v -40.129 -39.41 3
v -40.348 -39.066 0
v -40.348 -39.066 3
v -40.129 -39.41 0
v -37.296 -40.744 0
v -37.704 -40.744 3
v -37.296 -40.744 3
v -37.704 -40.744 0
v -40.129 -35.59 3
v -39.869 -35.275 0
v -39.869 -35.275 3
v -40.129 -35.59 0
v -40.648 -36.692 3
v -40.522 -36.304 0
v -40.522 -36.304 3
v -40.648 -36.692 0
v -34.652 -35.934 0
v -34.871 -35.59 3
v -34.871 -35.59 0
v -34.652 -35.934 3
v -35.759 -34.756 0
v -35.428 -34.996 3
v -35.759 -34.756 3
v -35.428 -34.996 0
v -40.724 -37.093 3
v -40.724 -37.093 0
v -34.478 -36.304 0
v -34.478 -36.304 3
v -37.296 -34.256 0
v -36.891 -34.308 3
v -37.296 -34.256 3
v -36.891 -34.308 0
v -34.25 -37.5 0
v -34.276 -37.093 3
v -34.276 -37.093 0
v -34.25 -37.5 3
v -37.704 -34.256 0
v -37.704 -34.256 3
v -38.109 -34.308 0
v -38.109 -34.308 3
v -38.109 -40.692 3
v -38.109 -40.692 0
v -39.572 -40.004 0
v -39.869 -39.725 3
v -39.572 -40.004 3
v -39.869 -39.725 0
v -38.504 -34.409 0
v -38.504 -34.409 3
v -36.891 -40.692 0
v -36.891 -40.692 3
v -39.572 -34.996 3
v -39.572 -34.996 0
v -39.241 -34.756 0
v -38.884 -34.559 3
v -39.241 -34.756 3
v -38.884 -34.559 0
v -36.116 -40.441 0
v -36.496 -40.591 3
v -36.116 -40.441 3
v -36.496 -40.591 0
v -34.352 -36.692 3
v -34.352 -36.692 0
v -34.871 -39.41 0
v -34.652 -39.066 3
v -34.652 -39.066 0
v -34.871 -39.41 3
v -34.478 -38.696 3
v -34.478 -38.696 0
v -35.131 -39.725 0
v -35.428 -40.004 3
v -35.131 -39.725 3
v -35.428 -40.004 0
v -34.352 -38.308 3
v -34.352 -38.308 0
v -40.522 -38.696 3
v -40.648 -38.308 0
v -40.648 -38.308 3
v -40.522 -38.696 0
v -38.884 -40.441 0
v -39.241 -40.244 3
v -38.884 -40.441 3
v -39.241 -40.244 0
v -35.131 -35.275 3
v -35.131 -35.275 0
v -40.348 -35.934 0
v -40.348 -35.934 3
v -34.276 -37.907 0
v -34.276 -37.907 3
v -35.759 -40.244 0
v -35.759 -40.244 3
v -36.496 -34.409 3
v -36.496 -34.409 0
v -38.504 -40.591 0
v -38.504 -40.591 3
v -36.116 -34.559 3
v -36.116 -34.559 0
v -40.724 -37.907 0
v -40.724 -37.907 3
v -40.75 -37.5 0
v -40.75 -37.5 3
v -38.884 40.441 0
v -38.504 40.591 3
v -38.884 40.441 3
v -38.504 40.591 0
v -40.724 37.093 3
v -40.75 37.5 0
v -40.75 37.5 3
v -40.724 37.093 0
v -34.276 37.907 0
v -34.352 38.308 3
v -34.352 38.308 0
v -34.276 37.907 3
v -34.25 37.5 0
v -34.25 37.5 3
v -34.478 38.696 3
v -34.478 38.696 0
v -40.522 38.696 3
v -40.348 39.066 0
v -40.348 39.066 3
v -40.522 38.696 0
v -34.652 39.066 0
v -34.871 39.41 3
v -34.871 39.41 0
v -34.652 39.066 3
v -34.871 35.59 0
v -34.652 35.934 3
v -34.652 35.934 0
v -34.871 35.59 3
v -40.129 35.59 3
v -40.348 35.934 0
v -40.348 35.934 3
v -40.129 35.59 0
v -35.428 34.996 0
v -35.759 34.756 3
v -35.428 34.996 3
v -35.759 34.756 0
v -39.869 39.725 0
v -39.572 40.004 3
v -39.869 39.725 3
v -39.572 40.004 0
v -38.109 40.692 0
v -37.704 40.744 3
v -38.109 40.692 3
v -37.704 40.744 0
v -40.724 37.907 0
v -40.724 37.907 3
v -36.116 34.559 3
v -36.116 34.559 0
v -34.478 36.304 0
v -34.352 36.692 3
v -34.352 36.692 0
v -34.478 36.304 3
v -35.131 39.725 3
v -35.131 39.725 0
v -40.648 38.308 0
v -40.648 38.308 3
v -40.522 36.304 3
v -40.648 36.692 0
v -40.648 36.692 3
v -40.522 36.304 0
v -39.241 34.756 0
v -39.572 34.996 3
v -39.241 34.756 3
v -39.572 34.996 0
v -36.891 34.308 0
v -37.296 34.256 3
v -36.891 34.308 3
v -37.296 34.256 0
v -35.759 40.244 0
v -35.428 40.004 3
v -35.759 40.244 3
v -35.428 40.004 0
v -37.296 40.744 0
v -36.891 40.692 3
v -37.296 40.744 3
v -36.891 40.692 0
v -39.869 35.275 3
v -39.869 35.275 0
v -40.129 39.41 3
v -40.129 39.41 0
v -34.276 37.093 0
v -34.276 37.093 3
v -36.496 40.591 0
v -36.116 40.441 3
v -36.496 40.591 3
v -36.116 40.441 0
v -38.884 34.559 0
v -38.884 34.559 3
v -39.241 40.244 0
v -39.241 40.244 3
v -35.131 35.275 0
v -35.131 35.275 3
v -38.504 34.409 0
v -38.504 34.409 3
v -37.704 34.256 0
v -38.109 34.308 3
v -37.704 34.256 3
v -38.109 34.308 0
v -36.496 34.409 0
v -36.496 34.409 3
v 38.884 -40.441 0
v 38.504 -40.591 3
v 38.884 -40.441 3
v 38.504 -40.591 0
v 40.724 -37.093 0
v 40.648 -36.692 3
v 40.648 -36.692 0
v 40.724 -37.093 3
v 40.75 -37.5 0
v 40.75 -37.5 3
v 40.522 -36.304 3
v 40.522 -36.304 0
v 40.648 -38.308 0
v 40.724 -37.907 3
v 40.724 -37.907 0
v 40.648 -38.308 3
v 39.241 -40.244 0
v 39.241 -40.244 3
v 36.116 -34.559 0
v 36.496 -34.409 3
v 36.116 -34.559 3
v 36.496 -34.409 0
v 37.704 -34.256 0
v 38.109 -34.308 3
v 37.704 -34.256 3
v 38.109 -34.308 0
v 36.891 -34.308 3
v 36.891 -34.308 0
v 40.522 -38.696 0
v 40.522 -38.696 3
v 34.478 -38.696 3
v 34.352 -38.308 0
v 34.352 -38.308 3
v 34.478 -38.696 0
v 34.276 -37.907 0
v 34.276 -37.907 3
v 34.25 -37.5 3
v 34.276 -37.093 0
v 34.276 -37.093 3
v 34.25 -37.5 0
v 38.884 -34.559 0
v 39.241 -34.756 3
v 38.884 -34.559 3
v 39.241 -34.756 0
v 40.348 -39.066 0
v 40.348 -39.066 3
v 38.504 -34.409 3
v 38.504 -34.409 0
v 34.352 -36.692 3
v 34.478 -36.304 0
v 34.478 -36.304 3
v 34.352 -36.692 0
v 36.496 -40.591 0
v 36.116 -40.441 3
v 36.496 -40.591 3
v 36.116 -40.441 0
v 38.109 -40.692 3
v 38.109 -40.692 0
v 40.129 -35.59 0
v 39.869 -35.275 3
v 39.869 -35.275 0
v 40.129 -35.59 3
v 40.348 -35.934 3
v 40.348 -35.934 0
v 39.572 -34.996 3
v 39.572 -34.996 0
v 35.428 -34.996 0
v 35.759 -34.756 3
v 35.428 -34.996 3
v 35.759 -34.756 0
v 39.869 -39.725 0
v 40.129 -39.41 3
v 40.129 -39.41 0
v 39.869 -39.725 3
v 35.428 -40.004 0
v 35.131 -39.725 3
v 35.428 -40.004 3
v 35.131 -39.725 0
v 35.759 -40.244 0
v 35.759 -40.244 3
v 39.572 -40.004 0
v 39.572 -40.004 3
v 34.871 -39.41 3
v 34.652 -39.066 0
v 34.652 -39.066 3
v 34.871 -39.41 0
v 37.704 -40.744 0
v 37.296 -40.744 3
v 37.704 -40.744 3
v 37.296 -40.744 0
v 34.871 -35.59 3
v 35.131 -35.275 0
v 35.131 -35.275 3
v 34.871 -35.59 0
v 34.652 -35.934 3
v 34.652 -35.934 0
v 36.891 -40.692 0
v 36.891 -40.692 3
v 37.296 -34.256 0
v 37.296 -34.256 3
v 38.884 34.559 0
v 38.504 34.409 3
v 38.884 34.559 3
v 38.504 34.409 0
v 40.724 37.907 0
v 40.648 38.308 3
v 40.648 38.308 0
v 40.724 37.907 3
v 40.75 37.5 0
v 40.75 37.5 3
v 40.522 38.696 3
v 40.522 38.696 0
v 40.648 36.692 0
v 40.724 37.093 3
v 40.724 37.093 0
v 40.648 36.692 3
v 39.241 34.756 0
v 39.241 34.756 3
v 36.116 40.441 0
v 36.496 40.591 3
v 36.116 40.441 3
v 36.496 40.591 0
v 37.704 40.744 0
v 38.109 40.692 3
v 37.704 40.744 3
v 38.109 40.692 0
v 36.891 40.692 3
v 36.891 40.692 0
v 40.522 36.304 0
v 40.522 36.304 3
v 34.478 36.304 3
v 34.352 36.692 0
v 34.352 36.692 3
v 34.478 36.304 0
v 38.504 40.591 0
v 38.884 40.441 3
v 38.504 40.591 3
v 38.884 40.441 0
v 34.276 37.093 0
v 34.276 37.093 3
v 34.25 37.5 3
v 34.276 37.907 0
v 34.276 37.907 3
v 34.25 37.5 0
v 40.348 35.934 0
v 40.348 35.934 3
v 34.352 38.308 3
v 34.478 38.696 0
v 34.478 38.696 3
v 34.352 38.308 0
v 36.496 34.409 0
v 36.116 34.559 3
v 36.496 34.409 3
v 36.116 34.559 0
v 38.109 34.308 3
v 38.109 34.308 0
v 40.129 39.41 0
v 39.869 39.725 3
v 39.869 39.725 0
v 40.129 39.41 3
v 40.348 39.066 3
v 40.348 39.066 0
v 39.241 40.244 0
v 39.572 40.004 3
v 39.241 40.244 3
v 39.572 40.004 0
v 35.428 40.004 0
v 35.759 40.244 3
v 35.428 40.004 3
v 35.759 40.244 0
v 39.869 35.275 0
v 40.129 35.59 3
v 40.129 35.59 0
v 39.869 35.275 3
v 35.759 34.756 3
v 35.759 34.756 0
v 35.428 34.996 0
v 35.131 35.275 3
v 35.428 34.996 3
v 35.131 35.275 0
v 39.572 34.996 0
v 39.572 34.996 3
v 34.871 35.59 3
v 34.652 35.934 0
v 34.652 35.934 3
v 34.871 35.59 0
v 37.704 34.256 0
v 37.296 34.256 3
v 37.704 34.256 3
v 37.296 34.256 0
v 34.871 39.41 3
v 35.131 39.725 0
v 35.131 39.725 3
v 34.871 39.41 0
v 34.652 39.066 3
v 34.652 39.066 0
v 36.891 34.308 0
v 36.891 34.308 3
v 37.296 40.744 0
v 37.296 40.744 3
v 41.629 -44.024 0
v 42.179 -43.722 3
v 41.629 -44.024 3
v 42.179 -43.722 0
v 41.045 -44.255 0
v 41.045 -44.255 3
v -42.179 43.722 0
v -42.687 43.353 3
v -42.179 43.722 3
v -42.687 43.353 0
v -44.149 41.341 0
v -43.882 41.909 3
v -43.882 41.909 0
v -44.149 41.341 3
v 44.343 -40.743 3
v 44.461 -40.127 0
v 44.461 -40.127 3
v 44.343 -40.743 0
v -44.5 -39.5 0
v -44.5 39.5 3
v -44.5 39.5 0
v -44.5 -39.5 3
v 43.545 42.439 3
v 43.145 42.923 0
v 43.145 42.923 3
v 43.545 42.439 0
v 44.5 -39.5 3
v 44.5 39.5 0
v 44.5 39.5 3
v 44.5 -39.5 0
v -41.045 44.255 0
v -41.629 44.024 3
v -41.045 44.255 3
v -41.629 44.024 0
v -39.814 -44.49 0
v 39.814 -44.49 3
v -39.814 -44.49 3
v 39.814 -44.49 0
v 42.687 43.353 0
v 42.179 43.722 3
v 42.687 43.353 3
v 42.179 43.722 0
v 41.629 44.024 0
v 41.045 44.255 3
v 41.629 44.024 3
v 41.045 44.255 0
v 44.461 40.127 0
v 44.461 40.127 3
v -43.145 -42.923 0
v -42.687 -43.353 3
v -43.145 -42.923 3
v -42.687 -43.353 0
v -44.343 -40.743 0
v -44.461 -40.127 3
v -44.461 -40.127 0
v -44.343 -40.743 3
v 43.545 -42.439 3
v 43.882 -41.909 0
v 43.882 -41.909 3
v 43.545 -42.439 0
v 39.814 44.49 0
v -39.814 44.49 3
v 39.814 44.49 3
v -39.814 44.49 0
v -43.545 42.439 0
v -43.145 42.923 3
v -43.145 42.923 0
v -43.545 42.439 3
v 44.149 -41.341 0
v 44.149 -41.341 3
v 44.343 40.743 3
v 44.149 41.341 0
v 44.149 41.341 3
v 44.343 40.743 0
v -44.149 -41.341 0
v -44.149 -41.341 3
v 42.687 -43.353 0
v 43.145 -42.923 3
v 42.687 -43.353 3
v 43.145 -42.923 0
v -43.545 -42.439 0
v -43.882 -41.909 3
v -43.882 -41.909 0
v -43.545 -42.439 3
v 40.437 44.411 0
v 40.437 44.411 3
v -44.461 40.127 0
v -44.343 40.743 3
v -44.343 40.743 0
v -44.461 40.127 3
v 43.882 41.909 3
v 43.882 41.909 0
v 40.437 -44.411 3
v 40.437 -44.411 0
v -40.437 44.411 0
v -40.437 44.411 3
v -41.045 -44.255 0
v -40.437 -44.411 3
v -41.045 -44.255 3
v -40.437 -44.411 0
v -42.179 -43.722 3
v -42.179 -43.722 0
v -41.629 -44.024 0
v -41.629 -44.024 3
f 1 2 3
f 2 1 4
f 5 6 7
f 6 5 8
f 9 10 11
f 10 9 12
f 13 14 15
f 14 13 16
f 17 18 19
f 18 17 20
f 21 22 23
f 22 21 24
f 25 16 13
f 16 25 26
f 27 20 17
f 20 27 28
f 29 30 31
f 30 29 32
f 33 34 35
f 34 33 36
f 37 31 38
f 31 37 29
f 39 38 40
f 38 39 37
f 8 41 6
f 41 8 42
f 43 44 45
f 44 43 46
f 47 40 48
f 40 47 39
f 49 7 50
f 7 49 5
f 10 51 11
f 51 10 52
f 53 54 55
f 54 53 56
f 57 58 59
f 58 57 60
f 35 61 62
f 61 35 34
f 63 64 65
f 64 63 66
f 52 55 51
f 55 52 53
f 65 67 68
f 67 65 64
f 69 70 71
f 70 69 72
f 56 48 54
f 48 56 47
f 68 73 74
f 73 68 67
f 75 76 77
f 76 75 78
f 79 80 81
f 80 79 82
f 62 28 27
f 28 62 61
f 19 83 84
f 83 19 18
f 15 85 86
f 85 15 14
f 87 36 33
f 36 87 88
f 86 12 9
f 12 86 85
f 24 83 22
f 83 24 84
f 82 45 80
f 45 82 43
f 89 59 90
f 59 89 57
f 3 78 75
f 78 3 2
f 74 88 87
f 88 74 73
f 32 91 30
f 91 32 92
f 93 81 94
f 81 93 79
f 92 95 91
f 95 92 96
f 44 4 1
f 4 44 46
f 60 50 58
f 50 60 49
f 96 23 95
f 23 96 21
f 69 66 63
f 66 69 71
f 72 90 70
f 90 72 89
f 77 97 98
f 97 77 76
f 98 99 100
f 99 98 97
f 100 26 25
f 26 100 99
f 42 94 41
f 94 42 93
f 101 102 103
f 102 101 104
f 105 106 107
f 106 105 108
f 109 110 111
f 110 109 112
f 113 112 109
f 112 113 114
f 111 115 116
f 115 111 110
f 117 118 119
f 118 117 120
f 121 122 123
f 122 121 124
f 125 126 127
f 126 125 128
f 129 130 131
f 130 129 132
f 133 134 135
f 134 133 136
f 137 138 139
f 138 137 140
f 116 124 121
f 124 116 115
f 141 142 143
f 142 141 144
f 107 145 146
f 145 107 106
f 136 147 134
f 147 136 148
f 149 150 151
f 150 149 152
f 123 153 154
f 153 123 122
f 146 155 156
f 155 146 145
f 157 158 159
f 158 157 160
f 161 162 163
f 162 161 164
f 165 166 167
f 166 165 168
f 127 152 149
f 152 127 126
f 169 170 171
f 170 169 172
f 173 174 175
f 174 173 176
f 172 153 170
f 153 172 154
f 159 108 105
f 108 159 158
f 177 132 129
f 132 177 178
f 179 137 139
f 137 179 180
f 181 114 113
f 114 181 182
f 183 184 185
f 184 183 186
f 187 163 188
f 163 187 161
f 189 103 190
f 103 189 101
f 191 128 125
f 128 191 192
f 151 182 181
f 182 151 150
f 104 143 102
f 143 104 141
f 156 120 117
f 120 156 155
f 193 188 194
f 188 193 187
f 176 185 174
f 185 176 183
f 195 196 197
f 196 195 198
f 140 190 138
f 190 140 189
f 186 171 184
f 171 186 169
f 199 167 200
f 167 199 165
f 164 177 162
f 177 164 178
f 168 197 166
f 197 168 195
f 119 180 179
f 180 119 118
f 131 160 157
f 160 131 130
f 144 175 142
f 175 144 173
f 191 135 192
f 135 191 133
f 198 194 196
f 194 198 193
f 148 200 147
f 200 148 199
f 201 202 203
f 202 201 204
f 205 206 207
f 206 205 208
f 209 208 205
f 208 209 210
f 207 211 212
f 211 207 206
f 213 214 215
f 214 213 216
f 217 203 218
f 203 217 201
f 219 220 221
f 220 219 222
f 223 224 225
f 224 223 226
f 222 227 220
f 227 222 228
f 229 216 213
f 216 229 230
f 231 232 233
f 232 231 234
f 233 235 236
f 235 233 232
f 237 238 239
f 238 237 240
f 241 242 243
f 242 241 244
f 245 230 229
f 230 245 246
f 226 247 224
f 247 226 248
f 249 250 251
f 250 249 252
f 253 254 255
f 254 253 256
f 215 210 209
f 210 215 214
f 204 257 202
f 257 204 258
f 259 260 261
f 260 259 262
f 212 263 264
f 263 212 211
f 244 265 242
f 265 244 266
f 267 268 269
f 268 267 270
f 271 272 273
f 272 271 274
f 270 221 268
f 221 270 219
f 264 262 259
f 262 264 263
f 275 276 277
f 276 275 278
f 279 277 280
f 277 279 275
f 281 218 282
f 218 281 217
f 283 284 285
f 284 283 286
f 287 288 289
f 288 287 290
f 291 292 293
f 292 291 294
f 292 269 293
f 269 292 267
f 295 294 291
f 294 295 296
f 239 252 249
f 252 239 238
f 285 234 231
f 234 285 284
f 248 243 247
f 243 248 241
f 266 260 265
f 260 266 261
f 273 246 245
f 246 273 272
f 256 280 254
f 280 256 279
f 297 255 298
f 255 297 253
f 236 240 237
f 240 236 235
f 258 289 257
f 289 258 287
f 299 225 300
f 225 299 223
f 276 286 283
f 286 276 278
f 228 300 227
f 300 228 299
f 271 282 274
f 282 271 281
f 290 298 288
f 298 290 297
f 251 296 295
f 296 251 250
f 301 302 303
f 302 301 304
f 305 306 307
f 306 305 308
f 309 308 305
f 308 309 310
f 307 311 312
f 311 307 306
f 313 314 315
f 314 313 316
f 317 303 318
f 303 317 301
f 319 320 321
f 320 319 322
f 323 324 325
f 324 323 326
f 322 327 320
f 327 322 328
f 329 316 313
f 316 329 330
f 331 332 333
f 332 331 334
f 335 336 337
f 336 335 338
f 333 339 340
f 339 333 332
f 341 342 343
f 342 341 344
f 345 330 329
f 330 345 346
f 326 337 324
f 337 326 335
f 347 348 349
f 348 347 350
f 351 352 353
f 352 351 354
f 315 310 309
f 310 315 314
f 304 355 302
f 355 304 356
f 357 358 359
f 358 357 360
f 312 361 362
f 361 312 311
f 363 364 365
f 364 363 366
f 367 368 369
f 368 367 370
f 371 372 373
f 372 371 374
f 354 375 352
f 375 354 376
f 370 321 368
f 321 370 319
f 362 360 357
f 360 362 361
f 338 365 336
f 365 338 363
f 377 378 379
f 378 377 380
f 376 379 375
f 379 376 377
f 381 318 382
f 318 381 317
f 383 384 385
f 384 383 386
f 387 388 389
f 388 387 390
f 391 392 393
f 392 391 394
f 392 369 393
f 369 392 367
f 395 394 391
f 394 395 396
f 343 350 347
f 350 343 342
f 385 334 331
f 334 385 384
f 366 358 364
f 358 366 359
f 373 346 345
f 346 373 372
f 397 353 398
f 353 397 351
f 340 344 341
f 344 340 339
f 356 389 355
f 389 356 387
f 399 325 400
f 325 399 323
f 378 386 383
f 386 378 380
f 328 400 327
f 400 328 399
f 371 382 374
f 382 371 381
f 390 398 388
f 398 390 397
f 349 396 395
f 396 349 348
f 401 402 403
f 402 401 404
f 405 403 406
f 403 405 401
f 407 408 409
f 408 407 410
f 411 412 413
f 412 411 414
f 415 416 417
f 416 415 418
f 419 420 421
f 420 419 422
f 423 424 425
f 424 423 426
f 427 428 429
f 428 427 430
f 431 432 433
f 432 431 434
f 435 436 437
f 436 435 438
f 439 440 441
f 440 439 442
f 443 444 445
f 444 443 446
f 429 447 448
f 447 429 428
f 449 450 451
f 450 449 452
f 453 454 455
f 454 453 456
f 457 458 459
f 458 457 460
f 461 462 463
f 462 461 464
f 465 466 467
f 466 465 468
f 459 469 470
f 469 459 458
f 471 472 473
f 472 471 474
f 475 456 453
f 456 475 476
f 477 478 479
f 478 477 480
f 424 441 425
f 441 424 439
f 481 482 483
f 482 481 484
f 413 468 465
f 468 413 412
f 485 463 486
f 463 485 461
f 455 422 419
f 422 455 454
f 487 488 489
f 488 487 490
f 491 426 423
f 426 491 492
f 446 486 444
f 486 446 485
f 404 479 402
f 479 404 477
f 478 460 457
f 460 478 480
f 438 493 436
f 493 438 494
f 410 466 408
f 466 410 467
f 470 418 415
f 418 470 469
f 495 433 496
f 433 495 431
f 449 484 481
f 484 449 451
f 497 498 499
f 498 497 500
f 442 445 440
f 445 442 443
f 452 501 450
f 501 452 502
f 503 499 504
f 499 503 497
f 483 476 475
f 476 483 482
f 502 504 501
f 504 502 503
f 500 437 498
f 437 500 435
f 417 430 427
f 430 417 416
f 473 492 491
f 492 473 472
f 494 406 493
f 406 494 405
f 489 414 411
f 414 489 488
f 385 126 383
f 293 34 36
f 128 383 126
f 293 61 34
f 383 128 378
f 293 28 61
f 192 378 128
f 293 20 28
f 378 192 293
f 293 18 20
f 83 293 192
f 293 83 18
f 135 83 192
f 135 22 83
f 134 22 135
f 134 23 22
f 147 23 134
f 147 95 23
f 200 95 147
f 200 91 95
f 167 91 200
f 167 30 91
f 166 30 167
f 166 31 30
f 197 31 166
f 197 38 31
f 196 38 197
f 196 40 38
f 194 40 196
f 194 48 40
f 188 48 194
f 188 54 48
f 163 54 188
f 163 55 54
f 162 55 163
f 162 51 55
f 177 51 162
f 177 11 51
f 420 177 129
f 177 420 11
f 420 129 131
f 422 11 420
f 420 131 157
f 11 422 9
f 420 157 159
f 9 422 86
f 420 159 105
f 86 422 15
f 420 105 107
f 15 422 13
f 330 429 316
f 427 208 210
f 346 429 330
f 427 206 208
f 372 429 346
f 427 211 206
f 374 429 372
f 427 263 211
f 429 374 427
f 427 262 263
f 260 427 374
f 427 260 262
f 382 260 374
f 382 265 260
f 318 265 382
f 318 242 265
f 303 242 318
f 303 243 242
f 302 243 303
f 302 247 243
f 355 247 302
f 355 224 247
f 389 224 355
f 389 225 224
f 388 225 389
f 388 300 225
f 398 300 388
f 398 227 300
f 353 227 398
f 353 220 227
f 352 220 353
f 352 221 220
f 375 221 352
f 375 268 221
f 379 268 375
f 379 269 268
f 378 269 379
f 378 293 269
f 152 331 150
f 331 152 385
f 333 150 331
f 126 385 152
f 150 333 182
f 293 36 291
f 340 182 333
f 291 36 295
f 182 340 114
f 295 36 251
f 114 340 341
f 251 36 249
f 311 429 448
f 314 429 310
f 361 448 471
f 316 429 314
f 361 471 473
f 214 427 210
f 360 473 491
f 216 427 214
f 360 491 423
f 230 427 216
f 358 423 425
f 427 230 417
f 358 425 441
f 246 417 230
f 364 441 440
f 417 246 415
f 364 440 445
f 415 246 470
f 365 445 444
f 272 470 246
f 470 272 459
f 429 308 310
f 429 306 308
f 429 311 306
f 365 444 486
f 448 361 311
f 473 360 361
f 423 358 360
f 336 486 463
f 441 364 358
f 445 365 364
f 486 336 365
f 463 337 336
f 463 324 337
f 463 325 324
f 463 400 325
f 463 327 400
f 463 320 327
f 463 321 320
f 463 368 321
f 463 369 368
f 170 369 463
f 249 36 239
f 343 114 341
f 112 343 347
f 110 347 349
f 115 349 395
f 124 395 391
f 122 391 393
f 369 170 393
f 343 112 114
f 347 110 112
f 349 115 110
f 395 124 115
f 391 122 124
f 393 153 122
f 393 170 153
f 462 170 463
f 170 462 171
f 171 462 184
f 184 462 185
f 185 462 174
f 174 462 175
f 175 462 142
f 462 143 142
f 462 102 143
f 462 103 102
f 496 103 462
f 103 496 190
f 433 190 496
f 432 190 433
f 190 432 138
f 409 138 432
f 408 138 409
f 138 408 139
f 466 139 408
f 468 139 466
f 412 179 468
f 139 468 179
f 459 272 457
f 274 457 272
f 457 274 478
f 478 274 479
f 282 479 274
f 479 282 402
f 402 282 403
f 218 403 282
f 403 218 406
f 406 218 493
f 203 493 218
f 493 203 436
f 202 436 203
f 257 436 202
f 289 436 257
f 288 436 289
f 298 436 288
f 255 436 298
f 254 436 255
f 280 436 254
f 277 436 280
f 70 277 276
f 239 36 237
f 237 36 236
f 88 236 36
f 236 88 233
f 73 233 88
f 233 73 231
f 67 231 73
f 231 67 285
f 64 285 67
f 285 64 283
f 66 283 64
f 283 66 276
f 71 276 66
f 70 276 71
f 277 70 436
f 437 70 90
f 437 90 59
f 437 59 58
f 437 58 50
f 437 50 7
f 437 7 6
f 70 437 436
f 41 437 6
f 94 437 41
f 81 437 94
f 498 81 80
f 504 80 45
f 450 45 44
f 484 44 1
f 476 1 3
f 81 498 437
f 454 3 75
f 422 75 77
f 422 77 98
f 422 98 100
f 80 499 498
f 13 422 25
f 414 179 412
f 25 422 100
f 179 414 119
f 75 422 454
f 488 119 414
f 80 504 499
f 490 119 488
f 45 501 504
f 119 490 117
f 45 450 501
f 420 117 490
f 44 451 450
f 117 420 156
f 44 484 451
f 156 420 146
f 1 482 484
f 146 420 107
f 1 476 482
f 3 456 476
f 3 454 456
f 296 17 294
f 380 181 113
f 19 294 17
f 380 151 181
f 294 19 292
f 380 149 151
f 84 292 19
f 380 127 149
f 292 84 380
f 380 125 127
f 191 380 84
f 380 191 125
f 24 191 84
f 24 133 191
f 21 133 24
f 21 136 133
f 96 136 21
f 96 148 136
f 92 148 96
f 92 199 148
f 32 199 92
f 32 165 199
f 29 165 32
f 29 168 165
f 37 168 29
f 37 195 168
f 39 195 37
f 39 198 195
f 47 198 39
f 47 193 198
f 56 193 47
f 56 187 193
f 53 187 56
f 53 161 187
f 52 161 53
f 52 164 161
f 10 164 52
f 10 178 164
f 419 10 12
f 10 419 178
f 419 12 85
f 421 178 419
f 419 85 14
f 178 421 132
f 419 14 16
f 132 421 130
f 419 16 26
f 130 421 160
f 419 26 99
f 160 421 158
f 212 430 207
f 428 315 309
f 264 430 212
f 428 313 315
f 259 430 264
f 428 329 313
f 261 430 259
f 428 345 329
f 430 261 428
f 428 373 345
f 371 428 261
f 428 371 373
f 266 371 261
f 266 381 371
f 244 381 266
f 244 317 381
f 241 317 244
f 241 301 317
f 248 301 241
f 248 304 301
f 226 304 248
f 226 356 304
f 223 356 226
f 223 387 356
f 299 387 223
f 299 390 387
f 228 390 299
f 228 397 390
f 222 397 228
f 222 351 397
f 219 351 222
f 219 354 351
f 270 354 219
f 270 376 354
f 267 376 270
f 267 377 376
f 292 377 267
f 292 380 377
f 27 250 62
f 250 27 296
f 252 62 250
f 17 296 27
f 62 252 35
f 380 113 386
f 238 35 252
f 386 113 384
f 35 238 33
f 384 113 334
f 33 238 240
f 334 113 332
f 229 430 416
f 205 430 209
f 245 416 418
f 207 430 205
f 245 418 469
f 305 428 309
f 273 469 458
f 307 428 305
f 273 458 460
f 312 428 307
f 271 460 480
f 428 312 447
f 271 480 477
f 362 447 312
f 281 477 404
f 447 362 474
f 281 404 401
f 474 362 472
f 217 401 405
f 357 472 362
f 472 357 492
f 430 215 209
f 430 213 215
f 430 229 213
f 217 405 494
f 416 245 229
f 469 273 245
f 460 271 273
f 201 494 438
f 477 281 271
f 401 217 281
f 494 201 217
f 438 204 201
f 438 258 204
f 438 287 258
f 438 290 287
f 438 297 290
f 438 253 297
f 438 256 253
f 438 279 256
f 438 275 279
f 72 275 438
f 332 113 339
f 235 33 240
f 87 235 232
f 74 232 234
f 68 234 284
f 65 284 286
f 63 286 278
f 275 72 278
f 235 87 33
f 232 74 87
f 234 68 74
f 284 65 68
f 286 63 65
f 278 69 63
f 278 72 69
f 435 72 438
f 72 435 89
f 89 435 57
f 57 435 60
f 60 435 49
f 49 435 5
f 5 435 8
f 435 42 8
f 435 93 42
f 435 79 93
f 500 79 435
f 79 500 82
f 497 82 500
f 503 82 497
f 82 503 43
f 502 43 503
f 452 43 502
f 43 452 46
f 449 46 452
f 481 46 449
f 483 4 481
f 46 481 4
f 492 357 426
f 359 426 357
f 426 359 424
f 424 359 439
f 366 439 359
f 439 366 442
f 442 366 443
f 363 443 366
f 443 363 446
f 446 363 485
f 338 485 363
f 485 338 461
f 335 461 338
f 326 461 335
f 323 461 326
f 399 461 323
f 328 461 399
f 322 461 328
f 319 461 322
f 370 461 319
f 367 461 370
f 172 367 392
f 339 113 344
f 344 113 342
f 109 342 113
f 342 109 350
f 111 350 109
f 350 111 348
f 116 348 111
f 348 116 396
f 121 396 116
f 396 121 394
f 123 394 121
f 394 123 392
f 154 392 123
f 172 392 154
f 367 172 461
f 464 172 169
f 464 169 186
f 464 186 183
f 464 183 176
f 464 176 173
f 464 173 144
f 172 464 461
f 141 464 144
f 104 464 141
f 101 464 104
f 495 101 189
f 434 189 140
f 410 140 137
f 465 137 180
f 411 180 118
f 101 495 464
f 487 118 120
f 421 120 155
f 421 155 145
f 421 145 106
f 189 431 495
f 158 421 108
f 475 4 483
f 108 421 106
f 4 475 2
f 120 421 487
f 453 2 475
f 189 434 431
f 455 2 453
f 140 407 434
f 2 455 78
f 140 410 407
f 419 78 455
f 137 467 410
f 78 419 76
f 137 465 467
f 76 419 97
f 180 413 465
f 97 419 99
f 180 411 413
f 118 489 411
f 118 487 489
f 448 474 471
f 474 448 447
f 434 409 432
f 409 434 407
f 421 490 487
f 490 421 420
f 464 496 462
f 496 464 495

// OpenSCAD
$fn = 50;


difference() {
	union() {
		hull() {
			translate(v = [-39.5000000000, 39.5000000000, 0]) {
				cylinder(h = 3, r = 5);
			}
			translate(v = [39.5000000000, 39.5000000000, 0]) {
				cylinder(h = 3, r = 5);
			}
			translate(v = [-39.5000000000, -39.5000000000, 0]) {
				cylinder(h = 3, r = 5);
			}
			translate(v = [39.5000000000, -39.5000000000, 0]) {
				cylinder(h = 3, r = 5);
			}
		}
	}
	union() {
		translate(v = [-37.5000000000, -37.5000000000, -100.0000000000]) {
			cylinder(h = 200, r = 3.2500000000);
		}
		translate(v = [-37.5000000000, 37.5000000000, -100.0000000000]) {
			cylinder(h = 200, r = 3.2500000000);
		}
		translate(v = [37.5000000000, -37.5000000000, -100.0000000000]) {
			cylinder(h = 200, r = 3.2500000000);
		}
		translate(v = [37.5000000000, 37.5000000000, -100.0000000000]) {
			cylinder(h = 200, r = 3.2500000000);
		}
	}
}
